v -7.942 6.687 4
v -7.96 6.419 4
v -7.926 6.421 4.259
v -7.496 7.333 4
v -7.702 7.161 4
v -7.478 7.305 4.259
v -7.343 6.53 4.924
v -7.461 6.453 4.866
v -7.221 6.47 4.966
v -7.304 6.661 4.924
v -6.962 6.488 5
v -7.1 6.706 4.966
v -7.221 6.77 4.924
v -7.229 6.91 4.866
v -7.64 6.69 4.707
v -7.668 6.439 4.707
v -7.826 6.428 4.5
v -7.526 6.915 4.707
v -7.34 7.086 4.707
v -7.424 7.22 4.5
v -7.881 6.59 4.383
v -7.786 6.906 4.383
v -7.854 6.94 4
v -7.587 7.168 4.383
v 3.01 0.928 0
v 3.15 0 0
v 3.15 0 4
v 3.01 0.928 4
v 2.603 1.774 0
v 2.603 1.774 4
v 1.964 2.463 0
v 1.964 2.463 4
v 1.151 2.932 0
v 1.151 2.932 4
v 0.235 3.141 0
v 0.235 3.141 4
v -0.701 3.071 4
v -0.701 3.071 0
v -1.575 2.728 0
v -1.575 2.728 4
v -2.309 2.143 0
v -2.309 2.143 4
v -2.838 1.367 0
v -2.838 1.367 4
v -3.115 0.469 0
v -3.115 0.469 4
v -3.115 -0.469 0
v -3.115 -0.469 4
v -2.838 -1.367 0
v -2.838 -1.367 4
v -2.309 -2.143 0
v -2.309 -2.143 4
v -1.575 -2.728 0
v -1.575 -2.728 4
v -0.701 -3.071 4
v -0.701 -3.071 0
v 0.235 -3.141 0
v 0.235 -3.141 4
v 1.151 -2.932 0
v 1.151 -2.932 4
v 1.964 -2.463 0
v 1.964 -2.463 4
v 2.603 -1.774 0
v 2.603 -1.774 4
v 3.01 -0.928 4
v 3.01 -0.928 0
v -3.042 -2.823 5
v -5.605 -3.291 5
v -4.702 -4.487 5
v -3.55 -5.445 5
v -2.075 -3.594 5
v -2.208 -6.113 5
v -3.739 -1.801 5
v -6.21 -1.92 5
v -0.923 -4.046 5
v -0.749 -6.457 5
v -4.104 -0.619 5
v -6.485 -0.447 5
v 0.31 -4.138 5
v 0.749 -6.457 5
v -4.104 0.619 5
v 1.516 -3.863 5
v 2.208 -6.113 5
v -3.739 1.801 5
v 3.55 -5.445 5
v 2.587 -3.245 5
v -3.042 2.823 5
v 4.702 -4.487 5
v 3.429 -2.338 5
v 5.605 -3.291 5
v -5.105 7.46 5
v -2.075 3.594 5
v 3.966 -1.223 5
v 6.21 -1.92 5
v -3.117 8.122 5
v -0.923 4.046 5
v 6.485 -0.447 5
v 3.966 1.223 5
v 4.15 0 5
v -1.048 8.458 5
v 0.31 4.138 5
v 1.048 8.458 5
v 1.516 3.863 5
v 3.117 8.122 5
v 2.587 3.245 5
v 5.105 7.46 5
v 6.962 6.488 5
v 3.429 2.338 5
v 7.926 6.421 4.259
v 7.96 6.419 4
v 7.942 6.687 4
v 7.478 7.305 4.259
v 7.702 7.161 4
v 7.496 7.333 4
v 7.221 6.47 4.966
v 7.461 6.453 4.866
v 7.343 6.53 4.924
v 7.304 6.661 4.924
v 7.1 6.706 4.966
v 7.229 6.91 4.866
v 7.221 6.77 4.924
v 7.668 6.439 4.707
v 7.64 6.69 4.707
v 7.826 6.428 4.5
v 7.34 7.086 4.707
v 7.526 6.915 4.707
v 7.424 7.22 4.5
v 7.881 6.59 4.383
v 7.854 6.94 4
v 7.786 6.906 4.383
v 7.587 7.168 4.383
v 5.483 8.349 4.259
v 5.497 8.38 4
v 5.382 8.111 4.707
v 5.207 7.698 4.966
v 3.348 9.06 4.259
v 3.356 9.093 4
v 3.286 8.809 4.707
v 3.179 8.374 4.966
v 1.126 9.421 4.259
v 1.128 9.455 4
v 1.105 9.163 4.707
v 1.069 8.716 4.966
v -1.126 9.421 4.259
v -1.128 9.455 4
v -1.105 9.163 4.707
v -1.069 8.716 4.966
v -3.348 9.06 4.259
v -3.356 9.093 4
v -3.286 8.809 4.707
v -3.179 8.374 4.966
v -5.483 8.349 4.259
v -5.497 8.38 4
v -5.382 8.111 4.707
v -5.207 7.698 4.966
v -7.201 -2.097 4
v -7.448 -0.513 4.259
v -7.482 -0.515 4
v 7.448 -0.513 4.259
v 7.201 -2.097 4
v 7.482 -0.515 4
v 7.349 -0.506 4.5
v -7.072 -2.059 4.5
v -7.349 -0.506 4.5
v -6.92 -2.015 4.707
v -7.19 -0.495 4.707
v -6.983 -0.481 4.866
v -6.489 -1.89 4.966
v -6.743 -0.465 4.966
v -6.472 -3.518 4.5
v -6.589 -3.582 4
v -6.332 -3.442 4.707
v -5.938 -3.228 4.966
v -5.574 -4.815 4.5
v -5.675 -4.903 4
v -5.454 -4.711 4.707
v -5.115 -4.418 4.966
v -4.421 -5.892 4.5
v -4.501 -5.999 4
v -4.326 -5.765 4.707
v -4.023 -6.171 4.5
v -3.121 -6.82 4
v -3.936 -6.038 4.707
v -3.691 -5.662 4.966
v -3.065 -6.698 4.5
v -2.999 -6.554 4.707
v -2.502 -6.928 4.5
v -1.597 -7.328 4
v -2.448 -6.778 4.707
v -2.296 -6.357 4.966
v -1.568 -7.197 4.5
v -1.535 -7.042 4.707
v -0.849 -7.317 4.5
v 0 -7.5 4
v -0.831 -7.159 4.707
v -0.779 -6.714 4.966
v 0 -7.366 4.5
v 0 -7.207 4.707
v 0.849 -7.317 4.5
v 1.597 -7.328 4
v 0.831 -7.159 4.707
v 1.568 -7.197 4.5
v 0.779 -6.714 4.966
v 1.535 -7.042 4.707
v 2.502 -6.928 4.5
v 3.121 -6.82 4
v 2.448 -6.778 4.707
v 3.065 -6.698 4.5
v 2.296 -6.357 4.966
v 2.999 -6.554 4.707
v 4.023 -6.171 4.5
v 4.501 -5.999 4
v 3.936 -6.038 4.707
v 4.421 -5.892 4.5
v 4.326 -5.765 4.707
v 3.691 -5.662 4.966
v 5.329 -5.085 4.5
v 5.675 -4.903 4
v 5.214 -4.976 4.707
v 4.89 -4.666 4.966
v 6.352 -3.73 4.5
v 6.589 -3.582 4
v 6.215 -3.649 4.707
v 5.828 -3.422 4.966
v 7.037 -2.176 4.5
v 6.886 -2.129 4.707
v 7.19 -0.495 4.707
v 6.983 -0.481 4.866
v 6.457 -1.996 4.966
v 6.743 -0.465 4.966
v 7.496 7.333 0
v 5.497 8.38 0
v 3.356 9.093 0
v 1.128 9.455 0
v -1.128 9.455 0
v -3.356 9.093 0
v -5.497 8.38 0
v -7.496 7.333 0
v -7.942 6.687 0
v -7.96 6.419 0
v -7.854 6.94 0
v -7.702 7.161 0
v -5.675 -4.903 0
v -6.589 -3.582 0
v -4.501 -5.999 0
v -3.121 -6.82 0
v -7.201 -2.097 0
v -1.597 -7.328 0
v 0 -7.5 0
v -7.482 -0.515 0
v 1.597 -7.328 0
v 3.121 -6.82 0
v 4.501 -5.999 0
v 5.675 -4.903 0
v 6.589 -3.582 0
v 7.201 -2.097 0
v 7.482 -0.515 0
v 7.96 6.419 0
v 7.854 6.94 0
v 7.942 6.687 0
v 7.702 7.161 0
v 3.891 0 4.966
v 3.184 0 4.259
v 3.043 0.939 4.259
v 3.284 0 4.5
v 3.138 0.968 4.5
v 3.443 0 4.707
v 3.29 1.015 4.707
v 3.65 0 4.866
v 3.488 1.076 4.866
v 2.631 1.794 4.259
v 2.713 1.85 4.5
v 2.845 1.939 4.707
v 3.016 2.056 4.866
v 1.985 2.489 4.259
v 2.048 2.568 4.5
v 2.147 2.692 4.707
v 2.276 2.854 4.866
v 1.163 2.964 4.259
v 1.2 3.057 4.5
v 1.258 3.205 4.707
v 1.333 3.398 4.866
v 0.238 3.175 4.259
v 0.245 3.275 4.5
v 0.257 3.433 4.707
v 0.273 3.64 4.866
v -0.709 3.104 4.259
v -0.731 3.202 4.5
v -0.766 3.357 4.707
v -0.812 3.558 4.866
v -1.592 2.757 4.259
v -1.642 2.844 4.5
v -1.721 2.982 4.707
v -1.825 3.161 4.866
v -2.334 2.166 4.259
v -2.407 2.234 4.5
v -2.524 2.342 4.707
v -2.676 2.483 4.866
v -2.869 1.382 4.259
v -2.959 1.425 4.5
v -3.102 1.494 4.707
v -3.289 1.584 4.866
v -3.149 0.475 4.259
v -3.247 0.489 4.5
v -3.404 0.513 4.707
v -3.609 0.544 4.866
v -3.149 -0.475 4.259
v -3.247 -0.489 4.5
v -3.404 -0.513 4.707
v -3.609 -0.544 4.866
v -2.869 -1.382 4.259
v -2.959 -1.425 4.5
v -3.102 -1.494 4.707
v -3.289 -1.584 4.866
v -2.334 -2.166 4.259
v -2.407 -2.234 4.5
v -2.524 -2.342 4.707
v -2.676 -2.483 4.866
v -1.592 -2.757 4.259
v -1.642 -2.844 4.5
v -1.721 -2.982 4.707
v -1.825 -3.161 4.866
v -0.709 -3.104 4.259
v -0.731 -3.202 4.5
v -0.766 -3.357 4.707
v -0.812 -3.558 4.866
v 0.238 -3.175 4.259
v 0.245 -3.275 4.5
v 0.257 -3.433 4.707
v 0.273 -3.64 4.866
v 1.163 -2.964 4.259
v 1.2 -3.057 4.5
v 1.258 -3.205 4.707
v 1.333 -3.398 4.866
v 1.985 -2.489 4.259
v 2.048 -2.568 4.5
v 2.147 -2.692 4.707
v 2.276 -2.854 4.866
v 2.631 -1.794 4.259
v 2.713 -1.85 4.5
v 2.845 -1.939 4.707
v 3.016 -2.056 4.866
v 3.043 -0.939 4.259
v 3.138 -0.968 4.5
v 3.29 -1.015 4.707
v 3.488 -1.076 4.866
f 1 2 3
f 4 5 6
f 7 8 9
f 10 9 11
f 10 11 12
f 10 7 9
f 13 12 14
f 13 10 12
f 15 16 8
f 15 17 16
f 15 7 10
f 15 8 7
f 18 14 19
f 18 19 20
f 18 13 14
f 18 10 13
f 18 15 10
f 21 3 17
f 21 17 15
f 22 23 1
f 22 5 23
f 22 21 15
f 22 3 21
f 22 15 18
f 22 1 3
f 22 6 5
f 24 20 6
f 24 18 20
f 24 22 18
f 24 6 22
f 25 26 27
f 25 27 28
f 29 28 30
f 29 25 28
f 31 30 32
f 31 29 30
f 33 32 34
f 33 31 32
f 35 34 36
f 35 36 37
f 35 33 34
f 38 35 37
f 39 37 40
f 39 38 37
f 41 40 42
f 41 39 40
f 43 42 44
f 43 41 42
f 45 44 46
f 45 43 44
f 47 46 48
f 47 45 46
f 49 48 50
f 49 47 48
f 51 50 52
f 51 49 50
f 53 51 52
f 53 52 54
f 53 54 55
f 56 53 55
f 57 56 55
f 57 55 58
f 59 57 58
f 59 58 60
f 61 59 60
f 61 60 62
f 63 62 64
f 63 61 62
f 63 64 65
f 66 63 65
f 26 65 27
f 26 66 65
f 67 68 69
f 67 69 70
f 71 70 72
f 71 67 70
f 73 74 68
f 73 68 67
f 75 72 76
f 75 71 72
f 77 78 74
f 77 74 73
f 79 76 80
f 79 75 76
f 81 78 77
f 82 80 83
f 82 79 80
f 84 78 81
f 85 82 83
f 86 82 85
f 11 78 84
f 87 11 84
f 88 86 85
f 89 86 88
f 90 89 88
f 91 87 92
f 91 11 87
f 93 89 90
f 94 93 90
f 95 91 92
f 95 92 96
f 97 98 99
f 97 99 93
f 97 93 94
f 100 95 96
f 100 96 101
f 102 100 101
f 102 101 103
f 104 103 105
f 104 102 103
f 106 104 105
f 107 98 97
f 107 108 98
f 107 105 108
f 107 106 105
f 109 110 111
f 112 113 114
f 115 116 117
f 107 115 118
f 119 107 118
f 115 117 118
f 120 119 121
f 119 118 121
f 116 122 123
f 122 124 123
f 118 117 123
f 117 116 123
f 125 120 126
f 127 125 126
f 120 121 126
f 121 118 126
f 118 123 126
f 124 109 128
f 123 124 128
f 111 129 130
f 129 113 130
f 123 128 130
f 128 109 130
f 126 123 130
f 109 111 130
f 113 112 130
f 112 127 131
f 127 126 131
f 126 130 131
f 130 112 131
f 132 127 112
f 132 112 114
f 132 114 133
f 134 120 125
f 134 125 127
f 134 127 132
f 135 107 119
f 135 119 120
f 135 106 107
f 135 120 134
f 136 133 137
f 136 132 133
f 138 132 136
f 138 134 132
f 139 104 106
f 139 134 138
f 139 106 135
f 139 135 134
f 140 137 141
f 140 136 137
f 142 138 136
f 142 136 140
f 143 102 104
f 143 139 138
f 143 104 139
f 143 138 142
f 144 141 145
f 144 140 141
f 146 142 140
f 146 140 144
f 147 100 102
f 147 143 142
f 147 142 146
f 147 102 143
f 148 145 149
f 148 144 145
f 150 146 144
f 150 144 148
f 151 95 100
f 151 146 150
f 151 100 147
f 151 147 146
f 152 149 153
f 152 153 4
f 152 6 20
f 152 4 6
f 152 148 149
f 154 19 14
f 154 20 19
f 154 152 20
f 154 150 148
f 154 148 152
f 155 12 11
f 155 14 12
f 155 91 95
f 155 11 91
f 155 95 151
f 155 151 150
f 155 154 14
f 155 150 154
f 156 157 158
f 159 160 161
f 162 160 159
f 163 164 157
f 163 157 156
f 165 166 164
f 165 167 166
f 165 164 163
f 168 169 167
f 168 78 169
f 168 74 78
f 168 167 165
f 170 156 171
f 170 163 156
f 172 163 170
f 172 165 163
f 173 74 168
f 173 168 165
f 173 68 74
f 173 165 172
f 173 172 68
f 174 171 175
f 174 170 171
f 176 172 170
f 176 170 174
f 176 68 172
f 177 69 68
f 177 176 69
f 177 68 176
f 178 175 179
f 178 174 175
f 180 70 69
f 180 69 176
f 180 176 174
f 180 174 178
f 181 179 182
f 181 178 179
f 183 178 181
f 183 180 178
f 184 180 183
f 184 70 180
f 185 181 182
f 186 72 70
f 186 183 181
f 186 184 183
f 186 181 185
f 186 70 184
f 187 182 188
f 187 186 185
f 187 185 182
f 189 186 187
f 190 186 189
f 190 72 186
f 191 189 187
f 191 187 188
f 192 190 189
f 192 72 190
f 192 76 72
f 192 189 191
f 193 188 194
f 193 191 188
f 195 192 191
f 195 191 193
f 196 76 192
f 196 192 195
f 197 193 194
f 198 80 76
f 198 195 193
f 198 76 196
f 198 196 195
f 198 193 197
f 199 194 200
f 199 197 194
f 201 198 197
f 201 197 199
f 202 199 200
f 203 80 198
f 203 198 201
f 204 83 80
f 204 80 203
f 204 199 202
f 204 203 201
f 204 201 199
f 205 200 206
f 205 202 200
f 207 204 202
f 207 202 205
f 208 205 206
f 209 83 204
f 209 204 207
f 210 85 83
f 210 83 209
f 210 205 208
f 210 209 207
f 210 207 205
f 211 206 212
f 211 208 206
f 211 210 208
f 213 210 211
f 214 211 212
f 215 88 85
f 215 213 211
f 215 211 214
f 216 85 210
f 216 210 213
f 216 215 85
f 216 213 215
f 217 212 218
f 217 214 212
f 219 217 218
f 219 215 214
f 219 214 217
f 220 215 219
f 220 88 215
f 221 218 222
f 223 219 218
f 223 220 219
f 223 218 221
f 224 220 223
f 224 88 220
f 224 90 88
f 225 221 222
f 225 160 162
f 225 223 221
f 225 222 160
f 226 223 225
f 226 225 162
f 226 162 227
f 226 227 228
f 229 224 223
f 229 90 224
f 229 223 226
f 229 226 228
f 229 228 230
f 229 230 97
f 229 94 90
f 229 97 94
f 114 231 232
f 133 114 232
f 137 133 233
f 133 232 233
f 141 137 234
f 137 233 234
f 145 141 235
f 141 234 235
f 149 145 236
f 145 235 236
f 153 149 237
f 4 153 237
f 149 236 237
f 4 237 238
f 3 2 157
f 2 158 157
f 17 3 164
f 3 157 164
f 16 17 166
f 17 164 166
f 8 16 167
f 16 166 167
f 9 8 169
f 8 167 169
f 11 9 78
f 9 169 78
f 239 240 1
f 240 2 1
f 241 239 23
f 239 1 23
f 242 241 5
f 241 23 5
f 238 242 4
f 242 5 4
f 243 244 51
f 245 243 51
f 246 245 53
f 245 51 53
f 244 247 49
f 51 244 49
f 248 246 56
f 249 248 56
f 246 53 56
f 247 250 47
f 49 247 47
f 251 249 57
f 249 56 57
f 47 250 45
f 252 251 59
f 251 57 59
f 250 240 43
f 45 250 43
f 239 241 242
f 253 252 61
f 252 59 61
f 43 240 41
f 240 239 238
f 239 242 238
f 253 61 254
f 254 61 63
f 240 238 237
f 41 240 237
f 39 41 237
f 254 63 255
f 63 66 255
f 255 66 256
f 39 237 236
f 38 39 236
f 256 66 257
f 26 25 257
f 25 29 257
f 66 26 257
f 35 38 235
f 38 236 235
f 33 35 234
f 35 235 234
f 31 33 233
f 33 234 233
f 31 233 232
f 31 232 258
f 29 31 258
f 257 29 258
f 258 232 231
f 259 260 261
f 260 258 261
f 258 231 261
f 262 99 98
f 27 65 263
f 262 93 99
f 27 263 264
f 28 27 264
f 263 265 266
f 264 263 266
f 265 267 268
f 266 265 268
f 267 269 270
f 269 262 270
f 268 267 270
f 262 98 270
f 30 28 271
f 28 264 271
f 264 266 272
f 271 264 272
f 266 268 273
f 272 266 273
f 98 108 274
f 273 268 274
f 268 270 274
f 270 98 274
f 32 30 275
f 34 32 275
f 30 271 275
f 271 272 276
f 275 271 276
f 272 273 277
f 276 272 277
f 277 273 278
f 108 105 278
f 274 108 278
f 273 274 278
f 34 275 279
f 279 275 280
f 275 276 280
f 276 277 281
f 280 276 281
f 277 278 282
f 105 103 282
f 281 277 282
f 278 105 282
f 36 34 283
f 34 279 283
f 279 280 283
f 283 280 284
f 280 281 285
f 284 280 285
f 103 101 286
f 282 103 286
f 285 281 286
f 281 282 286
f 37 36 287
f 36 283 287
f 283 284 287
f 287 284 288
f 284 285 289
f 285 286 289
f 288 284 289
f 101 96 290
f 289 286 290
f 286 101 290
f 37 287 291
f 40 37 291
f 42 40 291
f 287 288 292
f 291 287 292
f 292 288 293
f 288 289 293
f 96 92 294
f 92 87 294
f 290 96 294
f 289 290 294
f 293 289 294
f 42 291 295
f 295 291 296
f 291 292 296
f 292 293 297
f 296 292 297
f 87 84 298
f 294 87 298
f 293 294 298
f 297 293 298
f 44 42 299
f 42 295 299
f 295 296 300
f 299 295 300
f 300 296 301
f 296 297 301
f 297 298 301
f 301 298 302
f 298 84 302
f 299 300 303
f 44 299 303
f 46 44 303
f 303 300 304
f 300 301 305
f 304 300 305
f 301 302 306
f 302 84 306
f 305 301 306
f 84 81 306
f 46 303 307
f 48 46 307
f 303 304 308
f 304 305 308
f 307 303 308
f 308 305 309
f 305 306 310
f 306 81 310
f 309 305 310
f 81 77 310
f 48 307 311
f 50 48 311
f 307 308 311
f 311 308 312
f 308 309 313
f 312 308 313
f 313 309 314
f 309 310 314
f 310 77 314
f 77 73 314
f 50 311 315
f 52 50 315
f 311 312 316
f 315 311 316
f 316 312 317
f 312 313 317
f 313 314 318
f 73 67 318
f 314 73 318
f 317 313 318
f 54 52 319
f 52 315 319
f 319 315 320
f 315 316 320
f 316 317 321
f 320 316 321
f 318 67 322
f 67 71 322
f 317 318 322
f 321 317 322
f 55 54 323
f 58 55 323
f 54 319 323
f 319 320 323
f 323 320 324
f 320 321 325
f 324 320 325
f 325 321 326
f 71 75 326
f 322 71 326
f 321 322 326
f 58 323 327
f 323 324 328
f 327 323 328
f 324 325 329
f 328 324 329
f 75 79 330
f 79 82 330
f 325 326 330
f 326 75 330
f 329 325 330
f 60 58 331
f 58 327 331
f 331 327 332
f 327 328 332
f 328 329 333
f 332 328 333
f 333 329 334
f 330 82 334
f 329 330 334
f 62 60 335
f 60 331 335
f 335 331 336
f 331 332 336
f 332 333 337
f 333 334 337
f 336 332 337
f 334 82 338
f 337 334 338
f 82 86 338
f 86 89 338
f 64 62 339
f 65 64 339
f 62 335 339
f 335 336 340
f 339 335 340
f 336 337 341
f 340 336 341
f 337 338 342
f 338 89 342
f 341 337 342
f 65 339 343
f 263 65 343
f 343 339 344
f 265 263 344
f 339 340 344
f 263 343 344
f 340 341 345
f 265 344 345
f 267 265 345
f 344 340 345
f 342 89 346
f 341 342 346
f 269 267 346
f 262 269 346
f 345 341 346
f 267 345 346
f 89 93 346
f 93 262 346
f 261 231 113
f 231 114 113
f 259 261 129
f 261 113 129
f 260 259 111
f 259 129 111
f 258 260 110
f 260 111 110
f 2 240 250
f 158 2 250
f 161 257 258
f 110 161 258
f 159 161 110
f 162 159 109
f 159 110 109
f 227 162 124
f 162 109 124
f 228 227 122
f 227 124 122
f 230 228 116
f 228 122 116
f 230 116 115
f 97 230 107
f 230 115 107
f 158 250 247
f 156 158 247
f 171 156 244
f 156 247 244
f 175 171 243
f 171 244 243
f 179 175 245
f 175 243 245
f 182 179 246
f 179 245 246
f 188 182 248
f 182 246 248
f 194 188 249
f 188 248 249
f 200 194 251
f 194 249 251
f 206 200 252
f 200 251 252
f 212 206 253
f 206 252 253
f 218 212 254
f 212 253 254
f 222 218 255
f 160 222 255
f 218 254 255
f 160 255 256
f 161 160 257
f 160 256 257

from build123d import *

# Parameters (mm, degrees)
F0_R     = 3.15
F1_DEPTH = 5
F2_R     = 1


with BuildPart() as f1:
    # F0 (on Top) → F1 (new body)
    with BuildSketch(Plane.XY):
        with BuildLine():
            Line((-8, 7), (-7.482267, -0.515448))
            ThreePointArc((-7.482267, -0.515448), (0, -7.5), (7.482267, -0.515448))
            Line((7.482267, -0.515448), (8, 7))
            ThreePointArc((8, 7), (0, 9.5), (-8, 7))
        make_face()
        Circle(F0_R, mode=Mode.SUBTRACT)
    extrude(amount=F1_DEPTH)

    # F2
    f2_edges = [f1.edges().sort_by_distance(p)[0] for p in [
        (-8, 7, 2.5),
        (0, -7.5, 5),
        (0, 9.5, 5),
        (8, 7, 2.5),
        (-3.15, 0, 5),
    ]]
    fillet(f2_edges, radius=F2_R)


solid = f1.part
